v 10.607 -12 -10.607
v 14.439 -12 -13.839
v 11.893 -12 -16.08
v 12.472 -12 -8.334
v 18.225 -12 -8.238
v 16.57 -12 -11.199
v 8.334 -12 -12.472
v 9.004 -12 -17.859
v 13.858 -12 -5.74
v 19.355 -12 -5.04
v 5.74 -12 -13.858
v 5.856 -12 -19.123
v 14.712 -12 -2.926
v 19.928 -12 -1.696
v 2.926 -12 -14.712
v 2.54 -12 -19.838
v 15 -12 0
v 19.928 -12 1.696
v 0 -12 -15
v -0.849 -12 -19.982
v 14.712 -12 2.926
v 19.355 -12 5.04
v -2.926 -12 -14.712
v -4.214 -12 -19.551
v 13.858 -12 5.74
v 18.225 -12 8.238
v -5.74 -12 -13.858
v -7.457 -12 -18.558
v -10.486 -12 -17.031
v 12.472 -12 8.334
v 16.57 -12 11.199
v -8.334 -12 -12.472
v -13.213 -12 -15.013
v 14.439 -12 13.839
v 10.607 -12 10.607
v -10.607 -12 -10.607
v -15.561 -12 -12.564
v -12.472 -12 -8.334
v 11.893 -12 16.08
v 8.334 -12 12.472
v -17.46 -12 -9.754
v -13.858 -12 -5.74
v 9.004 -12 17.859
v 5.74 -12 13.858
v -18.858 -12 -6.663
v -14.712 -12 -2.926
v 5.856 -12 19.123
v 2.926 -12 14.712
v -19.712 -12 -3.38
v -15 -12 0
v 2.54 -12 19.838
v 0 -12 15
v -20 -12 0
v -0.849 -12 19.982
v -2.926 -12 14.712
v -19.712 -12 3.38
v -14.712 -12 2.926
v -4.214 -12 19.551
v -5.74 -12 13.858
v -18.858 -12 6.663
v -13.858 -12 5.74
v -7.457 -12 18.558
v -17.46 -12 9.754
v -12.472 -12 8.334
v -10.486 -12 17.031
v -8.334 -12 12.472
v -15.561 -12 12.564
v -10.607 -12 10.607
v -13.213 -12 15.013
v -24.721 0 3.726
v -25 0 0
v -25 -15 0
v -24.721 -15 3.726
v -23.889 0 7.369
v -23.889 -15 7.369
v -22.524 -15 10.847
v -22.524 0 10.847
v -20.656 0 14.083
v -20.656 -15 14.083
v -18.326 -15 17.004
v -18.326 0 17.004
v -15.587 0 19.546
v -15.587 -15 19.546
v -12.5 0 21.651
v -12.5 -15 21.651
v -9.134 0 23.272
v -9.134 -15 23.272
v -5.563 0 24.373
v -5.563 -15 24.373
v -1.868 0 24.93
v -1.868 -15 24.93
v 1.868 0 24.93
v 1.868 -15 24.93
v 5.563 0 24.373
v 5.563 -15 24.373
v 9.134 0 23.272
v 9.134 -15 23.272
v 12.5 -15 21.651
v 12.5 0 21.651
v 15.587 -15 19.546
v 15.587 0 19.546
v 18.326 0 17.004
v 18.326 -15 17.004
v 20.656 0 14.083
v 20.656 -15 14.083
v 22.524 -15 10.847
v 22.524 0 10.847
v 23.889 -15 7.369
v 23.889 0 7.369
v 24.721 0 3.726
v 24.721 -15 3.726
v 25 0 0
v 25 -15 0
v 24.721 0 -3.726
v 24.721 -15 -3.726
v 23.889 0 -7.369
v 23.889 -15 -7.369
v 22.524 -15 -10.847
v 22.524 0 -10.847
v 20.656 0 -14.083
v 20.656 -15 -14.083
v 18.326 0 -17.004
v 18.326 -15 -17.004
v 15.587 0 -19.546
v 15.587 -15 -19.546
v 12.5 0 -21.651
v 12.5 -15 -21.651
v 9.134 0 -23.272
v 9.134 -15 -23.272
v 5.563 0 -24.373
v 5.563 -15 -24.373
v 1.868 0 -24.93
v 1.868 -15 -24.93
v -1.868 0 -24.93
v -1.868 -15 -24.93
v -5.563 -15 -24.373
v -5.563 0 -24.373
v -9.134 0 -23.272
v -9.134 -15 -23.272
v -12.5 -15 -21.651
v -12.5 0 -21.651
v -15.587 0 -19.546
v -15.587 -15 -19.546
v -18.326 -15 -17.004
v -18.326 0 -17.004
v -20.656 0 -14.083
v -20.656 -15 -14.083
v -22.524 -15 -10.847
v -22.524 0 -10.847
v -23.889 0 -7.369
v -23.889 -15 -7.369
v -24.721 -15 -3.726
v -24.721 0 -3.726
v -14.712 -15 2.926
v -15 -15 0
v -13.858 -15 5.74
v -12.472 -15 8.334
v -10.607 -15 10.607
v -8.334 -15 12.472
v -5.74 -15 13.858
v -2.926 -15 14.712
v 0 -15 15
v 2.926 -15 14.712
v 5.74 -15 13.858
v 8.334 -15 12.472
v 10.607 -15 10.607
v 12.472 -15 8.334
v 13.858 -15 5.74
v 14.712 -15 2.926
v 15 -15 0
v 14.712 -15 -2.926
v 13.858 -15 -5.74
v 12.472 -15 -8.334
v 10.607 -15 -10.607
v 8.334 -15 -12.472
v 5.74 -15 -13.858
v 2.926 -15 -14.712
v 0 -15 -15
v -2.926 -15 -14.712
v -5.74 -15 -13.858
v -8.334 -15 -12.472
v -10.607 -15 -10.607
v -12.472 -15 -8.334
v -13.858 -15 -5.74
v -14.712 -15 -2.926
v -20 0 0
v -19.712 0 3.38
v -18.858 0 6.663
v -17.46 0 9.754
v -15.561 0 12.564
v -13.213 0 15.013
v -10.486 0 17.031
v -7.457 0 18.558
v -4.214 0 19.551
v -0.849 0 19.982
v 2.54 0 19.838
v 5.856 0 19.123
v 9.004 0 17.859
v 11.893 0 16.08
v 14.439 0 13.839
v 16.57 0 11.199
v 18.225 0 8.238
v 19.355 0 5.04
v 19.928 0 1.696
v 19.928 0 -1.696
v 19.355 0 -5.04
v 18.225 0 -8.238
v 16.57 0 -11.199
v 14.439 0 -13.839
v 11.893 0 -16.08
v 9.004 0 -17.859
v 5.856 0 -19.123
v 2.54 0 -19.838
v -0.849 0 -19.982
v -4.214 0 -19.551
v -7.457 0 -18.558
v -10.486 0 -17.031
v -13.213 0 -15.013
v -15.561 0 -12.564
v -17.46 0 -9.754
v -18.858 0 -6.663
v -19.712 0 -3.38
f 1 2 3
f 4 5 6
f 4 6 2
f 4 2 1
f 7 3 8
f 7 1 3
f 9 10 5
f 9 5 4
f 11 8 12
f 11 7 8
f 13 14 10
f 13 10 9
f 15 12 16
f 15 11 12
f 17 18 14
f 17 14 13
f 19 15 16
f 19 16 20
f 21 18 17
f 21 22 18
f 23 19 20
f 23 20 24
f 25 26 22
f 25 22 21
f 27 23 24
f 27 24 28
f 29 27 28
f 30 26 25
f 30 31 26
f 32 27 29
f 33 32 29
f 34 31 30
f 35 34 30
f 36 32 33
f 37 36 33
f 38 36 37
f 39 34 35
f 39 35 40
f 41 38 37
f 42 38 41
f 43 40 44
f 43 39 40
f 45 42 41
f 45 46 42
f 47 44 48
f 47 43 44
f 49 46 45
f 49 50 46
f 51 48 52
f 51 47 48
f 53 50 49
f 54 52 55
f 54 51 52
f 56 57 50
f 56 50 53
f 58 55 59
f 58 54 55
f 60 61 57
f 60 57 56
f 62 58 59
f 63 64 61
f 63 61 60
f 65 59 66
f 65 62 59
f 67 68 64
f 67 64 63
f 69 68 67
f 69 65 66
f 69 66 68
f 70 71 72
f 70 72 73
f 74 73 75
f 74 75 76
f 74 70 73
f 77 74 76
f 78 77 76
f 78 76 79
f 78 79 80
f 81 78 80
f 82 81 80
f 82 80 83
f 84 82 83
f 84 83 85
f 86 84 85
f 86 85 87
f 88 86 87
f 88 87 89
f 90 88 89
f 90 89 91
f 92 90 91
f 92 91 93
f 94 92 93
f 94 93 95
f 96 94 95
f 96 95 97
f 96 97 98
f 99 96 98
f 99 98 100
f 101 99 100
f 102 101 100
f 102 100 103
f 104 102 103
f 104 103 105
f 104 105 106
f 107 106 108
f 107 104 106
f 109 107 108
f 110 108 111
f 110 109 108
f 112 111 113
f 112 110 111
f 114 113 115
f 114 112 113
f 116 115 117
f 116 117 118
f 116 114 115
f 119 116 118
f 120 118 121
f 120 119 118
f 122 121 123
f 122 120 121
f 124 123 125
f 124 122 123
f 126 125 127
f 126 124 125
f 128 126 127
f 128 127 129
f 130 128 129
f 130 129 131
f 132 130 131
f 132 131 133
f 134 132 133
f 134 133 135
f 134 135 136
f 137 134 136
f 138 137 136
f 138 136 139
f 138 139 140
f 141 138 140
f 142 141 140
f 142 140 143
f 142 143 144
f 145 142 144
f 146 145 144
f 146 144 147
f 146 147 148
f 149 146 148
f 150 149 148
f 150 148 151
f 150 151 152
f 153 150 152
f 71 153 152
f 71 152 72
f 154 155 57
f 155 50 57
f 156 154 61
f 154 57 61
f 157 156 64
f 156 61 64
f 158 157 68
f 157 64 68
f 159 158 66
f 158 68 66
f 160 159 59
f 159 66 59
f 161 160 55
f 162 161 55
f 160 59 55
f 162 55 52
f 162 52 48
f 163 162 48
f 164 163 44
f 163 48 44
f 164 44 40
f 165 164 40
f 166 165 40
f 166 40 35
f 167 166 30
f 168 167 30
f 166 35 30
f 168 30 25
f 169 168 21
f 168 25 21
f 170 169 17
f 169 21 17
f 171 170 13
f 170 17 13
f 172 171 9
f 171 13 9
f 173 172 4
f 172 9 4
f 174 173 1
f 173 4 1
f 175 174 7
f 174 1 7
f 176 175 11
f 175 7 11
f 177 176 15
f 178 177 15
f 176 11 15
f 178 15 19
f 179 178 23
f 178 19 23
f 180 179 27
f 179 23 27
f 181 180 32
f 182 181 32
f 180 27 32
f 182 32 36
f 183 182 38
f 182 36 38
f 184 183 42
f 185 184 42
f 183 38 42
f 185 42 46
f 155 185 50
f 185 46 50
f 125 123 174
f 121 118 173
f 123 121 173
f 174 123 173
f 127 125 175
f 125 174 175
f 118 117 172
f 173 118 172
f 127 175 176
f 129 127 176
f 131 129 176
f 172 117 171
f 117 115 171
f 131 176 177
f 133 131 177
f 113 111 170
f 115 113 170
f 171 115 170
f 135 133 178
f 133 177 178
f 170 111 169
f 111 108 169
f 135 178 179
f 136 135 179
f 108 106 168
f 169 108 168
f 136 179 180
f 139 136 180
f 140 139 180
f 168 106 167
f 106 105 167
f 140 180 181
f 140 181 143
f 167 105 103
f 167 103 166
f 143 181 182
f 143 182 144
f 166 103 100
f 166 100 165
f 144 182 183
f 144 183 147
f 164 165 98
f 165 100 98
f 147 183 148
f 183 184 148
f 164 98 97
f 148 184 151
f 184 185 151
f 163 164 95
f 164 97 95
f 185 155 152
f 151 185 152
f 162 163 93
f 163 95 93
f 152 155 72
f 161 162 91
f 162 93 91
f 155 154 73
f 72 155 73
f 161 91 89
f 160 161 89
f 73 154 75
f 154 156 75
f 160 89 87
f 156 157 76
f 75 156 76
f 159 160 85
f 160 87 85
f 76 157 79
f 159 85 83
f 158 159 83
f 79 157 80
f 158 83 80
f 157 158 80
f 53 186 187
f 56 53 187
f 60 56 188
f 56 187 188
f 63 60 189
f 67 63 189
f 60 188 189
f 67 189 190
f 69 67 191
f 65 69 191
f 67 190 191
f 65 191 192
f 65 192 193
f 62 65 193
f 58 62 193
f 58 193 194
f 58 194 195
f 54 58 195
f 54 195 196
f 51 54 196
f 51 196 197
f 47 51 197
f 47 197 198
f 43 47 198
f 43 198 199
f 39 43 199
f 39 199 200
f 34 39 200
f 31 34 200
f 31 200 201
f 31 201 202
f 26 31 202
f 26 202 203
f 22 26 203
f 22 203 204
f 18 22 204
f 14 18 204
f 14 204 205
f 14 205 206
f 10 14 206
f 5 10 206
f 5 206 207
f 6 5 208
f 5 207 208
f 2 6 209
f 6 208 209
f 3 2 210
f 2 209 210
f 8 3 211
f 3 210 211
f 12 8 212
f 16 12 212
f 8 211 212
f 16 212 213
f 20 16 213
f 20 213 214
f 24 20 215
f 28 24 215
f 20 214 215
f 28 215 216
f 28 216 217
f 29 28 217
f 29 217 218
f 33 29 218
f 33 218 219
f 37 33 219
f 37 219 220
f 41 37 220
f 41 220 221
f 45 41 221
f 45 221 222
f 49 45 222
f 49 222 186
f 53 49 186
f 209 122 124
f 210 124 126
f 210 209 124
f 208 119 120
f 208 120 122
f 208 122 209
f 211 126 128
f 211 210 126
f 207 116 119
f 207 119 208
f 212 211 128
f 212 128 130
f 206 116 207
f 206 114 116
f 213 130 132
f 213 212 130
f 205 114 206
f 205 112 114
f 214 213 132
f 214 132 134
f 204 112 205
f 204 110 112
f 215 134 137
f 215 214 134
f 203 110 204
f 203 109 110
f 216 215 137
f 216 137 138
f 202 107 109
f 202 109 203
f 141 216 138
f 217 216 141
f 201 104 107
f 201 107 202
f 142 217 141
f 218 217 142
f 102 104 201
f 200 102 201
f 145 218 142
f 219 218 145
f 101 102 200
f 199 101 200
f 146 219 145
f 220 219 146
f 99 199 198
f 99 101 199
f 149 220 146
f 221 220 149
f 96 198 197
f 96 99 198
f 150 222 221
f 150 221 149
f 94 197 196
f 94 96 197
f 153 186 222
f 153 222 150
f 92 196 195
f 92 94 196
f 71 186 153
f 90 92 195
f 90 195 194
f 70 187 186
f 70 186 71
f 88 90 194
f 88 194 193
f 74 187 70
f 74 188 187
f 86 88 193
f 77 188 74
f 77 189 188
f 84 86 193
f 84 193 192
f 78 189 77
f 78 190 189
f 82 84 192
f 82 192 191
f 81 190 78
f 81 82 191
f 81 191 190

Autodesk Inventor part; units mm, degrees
ref_plane "YZ Plane" through (0, 0, 0) normal (1, 0, 0) x (0, 1, 0)
ref_plane "XZ Plane" through (0, 0, 0) normal (0, 1, 0) x (-1, 0, 0)
ref_plane "XY Plane" through (0, 0, 0) normal (0, 0, 1) x (1, 0, 0)
sketch "Sketch1" plane through (0, 0, 0) normal (0, 1, 0) x (-1, 0, 0)
  circle A0 centre (0, 0) radius 25
  dimension "d0" = 50
extrude "Extrusion1" add sketch "Sketch1" against normal blind 15
sketch "Sketch3" plane through (0, 0, 0) normal (0, 1, 0) x (-1, 0, 0)
  circle A0 centre (0, 0) radius 15
  dimension "d3" = 30
extrude "Extrusion2" cut sketch "Sketch3" against normal through all
sketch "Sketch4" plane through (0, 0, 0) normal (0, 1, 0) x (-1, 0, 0)
  circle A0 centre (0, 0) radius 20
  dimension "d6" = 40
extrude "Extrusion3" cut sketch "Sketch4" against normal blind 12
properties part number "Седло для подшипника"
